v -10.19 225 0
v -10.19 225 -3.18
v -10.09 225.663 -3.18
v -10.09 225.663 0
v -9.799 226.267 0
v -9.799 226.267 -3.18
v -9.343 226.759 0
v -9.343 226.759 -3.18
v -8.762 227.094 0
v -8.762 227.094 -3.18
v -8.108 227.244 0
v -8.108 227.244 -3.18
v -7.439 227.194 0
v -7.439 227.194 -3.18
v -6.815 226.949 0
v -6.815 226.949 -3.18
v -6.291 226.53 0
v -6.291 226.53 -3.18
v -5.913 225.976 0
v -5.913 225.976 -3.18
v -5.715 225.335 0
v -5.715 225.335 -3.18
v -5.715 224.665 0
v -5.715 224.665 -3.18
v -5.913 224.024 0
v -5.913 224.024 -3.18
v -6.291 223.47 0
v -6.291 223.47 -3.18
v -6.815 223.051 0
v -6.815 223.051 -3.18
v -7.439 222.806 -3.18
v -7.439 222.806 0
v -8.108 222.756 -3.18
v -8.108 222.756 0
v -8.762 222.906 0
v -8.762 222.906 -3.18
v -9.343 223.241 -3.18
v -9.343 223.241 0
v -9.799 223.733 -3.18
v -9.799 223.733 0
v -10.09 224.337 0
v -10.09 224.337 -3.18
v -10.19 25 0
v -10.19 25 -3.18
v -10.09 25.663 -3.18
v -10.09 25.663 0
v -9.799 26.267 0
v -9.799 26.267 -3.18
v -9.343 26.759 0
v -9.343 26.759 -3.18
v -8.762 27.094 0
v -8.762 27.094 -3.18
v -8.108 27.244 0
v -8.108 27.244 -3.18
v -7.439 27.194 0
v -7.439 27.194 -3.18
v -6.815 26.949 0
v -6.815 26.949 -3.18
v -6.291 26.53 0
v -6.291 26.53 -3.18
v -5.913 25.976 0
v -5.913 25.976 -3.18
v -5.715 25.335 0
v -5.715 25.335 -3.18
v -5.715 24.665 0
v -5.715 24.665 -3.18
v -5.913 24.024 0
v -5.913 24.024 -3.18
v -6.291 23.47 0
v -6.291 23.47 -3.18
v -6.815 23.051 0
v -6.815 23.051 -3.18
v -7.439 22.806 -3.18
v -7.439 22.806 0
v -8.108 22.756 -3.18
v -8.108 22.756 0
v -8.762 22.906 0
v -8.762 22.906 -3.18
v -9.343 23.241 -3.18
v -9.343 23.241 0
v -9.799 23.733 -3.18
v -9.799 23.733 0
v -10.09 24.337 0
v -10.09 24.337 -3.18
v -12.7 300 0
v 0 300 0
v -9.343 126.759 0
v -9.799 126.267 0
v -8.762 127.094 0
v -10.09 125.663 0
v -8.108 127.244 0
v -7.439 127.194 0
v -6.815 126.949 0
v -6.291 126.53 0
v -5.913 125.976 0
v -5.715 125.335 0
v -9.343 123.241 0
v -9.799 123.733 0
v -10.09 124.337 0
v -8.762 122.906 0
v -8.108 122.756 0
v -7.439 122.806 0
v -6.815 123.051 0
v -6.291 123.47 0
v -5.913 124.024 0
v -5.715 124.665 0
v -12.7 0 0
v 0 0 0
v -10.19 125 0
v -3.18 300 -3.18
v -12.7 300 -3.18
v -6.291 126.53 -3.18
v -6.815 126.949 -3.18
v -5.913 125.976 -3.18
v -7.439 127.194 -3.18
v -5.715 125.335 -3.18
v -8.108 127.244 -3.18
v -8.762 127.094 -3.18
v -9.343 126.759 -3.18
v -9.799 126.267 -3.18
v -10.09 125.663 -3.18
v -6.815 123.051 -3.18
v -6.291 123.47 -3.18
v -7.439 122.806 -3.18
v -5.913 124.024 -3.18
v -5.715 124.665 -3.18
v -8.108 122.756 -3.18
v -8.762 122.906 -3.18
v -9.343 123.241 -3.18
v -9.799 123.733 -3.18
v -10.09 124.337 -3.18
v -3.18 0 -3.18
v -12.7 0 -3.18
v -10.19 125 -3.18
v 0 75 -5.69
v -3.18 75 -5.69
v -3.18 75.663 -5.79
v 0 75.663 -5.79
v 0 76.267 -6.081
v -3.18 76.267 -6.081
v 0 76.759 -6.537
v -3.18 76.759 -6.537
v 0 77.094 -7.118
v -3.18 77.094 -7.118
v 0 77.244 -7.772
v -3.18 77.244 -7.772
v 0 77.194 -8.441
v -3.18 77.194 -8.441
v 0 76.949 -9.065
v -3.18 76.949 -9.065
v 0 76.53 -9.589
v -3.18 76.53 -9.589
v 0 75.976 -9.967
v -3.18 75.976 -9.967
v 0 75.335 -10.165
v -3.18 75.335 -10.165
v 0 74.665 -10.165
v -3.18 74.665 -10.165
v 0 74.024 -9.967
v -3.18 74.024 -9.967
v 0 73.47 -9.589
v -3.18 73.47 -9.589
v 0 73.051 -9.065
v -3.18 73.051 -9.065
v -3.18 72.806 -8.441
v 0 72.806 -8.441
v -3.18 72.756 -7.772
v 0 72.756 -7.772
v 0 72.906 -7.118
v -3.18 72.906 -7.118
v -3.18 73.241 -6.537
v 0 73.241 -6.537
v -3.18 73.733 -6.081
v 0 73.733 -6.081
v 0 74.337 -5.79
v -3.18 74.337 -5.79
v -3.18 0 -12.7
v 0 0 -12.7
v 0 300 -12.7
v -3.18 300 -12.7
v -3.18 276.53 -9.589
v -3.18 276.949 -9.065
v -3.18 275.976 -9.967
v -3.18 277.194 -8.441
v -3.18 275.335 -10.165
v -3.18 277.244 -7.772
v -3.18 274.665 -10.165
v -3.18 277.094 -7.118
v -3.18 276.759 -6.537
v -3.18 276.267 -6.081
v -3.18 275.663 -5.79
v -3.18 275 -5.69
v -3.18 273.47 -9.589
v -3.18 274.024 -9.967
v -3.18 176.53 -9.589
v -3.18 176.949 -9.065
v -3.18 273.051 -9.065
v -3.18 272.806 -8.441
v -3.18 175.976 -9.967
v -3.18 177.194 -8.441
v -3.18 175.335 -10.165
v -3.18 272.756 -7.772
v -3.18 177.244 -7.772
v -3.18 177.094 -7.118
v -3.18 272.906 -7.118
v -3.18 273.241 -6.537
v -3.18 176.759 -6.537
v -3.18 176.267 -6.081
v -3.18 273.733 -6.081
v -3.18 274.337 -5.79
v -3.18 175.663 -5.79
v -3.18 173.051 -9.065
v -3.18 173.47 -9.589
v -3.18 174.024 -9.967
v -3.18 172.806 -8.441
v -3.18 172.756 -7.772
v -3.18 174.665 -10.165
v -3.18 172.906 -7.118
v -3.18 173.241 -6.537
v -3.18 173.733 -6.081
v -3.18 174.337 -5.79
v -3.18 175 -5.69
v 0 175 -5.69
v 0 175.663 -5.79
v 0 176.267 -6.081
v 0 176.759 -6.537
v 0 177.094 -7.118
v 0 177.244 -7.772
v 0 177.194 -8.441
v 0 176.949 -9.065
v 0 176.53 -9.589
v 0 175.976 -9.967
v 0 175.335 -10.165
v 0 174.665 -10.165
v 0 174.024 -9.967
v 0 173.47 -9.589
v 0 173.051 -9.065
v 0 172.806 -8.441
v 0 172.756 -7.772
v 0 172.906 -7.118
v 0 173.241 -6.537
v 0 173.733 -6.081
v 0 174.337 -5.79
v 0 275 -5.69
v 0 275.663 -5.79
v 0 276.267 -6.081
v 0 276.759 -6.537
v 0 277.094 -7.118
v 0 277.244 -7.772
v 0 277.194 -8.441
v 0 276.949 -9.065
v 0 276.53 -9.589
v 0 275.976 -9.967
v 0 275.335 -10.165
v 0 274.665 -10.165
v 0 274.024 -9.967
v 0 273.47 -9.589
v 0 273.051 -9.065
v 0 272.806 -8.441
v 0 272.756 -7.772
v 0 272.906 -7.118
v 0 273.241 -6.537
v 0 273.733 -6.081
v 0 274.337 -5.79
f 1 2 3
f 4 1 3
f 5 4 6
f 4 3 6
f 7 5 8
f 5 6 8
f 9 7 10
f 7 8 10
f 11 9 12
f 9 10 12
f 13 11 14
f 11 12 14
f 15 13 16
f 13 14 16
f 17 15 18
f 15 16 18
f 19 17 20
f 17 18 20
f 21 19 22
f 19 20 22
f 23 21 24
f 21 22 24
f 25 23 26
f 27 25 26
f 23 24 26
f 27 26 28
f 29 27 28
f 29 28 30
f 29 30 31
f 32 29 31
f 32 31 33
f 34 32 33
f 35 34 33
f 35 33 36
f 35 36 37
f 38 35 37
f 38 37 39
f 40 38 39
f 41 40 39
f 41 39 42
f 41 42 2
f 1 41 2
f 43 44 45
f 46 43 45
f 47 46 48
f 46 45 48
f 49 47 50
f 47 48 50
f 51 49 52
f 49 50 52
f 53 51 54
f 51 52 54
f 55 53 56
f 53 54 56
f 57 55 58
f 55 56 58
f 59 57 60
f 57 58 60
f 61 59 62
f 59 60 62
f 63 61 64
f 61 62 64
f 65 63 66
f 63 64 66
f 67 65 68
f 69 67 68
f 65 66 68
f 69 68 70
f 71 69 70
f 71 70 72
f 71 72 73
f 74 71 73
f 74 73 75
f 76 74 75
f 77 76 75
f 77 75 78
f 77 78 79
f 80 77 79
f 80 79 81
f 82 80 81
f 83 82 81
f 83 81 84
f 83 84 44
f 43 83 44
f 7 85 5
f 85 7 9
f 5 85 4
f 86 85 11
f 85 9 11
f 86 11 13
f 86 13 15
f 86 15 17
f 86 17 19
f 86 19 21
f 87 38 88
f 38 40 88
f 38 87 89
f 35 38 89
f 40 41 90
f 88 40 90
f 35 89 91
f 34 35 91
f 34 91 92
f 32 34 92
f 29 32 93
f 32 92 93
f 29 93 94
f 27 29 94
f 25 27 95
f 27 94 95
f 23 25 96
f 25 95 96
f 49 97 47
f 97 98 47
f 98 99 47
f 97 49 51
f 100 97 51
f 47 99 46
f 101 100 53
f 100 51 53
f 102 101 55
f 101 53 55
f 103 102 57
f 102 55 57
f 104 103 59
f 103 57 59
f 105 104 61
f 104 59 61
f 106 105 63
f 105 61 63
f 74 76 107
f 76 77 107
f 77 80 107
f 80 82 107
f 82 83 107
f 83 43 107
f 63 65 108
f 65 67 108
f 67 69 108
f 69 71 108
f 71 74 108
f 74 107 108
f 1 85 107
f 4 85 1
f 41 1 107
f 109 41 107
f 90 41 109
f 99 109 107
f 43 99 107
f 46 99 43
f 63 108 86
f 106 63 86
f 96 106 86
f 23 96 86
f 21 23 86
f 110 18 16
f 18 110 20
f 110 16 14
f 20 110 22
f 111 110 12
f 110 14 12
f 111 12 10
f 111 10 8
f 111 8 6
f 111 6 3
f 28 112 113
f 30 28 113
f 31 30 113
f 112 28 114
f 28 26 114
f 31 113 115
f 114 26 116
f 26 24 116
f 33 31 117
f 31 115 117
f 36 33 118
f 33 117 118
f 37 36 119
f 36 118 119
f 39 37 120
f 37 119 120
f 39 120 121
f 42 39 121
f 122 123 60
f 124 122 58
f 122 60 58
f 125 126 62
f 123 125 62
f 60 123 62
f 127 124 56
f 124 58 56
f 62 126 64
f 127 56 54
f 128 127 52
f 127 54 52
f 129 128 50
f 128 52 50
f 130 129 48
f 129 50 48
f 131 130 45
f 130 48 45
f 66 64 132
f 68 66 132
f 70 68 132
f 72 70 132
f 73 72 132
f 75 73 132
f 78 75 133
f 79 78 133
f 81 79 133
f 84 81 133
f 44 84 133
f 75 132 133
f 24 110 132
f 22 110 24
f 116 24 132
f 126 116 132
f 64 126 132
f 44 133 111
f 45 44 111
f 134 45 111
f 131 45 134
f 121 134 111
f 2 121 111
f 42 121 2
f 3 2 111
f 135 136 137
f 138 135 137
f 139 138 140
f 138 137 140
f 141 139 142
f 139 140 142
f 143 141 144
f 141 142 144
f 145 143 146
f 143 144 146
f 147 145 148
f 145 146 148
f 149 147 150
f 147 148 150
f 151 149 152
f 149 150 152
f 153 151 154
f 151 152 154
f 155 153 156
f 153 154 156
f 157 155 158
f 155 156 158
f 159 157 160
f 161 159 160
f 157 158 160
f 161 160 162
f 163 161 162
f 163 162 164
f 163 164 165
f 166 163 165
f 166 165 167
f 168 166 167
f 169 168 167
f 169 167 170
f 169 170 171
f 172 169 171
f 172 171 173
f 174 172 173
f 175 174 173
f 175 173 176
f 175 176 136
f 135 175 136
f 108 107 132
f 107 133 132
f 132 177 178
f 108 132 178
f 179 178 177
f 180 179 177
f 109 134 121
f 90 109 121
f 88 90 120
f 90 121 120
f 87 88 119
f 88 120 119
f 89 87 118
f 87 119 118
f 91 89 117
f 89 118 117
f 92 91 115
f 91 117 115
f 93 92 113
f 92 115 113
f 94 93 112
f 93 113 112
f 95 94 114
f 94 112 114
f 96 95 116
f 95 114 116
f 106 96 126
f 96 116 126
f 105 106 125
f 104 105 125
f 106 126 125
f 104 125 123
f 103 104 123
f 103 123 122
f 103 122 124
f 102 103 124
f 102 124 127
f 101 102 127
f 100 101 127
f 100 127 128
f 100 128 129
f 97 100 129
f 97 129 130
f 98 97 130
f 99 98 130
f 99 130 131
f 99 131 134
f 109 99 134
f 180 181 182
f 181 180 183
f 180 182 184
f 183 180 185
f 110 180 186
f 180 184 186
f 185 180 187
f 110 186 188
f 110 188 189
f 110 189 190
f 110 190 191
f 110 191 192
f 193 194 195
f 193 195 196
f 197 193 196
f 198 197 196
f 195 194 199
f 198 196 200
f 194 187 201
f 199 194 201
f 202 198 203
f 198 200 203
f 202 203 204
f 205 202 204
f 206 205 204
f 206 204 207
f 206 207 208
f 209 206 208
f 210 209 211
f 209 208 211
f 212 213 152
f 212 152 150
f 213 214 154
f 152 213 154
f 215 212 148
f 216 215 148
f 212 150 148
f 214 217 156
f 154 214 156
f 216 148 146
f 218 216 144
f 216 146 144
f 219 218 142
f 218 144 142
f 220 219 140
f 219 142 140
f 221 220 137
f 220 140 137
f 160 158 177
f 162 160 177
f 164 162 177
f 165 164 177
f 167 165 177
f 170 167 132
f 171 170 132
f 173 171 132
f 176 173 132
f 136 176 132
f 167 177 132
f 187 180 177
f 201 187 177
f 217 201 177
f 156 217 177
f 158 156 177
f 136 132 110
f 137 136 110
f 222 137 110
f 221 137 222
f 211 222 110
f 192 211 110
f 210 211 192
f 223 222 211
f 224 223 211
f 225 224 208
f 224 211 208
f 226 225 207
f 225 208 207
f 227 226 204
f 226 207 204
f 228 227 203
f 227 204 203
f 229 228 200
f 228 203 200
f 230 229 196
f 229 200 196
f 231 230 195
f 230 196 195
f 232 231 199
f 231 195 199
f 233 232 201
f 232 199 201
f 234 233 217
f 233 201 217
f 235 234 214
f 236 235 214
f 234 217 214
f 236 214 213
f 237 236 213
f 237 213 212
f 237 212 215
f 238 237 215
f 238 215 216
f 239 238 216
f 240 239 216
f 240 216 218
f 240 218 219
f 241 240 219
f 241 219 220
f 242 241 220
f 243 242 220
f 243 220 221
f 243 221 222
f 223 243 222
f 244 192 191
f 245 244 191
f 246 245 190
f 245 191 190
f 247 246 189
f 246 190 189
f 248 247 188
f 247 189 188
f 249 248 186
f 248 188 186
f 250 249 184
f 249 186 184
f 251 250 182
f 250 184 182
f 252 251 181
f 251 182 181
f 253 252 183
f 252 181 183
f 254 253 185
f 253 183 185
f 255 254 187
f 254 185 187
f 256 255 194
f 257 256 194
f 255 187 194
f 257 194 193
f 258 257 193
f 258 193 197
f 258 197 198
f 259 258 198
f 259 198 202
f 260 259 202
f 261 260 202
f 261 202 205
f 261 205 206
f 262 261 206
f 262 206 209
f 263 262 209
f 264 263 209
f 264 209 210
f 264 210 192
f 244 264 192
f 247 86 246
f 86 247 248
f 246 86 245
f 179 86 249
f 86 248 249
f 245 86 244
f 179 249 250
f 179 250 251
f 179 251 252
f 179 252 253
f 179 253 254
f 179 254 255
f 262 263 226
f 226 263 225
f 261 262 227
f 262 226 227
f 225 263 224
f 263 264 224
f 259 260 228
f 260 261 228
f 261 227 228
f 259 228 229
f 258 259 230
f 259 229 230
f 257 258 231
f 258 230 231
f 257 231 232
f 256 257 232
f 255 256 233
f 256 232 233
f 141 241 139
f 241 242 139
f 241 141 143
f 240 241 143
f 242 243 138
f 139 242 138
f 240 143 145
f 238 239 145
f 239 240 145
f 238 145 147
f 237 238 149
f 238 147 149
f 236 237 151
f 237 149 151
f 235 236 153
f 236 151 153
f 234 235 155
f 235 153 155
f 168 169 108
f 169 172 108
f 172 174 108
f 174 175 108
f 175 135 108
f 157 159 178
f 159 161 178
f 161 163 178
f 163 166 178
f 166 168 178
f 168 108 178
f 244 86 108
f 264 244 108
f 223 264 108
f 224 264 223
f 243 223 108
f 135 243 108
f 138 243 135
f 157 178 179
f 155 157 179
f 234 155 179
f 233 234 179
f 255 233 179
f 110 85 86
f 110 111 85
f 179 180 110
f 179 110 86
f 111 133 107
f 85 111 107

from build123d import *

# Parameters (mm, degrees)
BOSS_EXTRUDE1_DEPTH = 300
SKETCH2_R           = 2.25
CUT_EXTRUDE1_DEPTH  = 10
SKETCH3_R           = 2.25
CUT_EXTRUDE2_DEPTH  = 10


with BuildPart() as part:
    # Sketch1 → Boss-Extrude1 (new body)
    with BuildSketch(Plane(origin=(0, 0, 0), x_dir=(1, 0, 0), z_dir=(0, 1, 0))):
        Polygon((-12.7, 0), (0, 0), (0, 12.7), (-3.18, 12.7), (-3.18, 3.18), (-12.7, 3.18), align=None)
    extrude(amount=BOSS_EXTRUDE1_DEPTH)

    # Sketch2 → Cut-Extrude1 (cut)
    with BuildSketch(Plane.ZY.offset(3.18)):
        with Locations((-7.94, 275)):
            Circle(SKETCH2_R)
        with Locations((-7.94, 175)):
            Circle(SKETCH2_R)
        with Locations((-7.94, 75)):
            Circle(SKETCH2_R)
    extrude(amount=-CUT_EXTRUDE1_DEPTH, mode=Mode.SUBTRACT)

    # Sketch3 → Cut-Extrude2 (cut)
    with BuildSketch(Plane(origin=(0, 0, -3.18), x_dir=(-1, 0, 0), z_dir=(0, 0, -1))):
        with Locations((7.94, 225)):
            Circle(SKETCH3_R)
        with Locations((7.94, 125)):
            Circle(SKETCH3_R)
        with Locations((7.94, 25)):
            Circle(SKETCH3_R)
    extrude(amount=-CUT_EXTRUDE2_DEPTH, mode=Mode.SUBTRACT)


solid = part.part
